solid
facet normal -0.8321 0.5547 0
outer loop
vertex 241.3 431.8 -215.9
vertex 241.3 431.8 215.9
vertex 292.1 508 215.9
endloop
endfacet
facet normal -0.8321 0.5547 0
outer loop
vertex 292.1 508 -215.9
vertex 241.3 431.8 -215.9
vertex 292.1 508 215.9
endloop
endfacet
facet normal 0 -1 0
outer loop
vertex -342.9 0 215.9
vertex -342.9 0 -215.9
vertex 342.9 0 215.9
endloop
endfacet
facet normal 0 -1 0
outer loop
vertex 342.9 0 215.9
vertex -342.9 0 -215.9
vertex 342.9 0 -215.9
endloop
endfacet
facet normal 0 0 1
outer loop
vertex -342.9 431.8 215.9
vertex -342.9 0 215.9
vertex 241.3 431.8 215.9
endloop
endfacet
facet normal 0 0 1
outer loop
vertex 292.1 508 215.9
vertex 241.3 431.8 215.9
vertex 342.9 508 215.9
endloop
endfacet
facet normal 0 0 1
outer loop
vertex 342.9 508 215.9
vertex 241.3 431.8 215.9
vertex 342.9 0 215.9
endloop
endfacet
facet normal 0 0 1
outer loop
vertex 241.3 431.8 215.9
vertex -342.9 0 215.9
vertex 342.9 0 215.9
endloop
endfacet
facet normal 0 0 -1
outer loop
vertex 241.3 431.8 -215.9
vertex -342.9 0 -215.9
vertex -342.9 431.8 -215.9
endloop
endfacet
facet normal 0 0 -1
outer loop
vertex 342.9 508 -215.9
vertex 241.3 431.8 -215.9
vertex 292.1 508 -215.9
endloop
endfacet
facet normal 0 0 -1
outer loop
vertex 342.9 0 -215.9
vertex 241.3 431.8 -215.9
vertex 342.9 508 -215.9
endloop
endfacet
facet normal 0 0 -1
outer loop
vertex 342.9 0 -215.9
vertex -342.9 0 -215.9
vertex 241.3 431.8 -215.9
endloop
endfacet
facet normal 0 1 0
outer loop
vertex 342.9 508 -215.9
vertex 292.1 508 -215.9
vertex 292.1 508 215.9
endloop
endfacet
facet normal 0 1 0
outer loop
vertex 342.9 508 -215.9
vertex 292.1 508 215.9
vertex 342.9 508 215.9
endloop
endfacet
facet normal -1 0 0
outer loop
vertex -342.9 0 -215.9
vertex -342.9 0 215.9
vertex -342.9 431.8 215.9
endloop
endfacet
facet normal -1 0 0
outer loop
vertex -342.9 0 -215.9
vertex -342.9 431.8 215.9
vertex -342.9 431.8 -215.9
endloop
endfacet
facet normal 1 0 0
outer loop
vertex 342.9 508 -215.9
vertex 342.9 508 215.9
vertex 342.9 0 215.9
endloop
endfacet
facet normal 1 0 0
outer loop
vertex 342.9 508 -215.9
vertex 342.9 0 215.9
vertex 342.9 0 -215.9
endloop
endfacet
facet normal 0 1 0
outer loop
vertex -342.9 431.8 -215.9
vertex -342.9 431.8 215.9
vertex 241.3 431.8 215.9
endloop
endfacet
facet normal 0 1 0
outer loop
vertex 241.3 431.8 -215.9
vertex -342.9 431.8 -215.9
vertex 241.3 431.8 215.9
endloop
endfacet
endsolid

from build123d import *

# Parameters (mm, degrees)
SKETCH1_W           = 685.8
SKETCH1_H           = 431.8
BOSS_EXTRUDE1_DEPTH = 508
CUT_EXTRUDE1_DEPTH  = 432.8


with BuildPart() as part:
    # Sketch1 → Boss-Extrude1 (new body)
    with BuildSketch(Plane(origin=(0, 0, 0), x_dir=(1, 0, 0), z_dir=(0, 1, 0))):
        Rectangle(SKETCH1_W, SKETCH1_H)
    extrude(amount=BOSS_EXTRUDE1_DEPTH)

    # Sketch2 → Cut-Extrude1 (cut, through all)
    with BuildSketch(Plane.XY.offset(215.9)):
        Polygon((-342.9, 431.8), (241.3, 431.8), (292.1, 508), (-342.9, 508), align=None)
    extrude(amount=-CUT_EXTRUDE1_DEPTH, mode=Mode.SUBTRACT)


solid = part.part
